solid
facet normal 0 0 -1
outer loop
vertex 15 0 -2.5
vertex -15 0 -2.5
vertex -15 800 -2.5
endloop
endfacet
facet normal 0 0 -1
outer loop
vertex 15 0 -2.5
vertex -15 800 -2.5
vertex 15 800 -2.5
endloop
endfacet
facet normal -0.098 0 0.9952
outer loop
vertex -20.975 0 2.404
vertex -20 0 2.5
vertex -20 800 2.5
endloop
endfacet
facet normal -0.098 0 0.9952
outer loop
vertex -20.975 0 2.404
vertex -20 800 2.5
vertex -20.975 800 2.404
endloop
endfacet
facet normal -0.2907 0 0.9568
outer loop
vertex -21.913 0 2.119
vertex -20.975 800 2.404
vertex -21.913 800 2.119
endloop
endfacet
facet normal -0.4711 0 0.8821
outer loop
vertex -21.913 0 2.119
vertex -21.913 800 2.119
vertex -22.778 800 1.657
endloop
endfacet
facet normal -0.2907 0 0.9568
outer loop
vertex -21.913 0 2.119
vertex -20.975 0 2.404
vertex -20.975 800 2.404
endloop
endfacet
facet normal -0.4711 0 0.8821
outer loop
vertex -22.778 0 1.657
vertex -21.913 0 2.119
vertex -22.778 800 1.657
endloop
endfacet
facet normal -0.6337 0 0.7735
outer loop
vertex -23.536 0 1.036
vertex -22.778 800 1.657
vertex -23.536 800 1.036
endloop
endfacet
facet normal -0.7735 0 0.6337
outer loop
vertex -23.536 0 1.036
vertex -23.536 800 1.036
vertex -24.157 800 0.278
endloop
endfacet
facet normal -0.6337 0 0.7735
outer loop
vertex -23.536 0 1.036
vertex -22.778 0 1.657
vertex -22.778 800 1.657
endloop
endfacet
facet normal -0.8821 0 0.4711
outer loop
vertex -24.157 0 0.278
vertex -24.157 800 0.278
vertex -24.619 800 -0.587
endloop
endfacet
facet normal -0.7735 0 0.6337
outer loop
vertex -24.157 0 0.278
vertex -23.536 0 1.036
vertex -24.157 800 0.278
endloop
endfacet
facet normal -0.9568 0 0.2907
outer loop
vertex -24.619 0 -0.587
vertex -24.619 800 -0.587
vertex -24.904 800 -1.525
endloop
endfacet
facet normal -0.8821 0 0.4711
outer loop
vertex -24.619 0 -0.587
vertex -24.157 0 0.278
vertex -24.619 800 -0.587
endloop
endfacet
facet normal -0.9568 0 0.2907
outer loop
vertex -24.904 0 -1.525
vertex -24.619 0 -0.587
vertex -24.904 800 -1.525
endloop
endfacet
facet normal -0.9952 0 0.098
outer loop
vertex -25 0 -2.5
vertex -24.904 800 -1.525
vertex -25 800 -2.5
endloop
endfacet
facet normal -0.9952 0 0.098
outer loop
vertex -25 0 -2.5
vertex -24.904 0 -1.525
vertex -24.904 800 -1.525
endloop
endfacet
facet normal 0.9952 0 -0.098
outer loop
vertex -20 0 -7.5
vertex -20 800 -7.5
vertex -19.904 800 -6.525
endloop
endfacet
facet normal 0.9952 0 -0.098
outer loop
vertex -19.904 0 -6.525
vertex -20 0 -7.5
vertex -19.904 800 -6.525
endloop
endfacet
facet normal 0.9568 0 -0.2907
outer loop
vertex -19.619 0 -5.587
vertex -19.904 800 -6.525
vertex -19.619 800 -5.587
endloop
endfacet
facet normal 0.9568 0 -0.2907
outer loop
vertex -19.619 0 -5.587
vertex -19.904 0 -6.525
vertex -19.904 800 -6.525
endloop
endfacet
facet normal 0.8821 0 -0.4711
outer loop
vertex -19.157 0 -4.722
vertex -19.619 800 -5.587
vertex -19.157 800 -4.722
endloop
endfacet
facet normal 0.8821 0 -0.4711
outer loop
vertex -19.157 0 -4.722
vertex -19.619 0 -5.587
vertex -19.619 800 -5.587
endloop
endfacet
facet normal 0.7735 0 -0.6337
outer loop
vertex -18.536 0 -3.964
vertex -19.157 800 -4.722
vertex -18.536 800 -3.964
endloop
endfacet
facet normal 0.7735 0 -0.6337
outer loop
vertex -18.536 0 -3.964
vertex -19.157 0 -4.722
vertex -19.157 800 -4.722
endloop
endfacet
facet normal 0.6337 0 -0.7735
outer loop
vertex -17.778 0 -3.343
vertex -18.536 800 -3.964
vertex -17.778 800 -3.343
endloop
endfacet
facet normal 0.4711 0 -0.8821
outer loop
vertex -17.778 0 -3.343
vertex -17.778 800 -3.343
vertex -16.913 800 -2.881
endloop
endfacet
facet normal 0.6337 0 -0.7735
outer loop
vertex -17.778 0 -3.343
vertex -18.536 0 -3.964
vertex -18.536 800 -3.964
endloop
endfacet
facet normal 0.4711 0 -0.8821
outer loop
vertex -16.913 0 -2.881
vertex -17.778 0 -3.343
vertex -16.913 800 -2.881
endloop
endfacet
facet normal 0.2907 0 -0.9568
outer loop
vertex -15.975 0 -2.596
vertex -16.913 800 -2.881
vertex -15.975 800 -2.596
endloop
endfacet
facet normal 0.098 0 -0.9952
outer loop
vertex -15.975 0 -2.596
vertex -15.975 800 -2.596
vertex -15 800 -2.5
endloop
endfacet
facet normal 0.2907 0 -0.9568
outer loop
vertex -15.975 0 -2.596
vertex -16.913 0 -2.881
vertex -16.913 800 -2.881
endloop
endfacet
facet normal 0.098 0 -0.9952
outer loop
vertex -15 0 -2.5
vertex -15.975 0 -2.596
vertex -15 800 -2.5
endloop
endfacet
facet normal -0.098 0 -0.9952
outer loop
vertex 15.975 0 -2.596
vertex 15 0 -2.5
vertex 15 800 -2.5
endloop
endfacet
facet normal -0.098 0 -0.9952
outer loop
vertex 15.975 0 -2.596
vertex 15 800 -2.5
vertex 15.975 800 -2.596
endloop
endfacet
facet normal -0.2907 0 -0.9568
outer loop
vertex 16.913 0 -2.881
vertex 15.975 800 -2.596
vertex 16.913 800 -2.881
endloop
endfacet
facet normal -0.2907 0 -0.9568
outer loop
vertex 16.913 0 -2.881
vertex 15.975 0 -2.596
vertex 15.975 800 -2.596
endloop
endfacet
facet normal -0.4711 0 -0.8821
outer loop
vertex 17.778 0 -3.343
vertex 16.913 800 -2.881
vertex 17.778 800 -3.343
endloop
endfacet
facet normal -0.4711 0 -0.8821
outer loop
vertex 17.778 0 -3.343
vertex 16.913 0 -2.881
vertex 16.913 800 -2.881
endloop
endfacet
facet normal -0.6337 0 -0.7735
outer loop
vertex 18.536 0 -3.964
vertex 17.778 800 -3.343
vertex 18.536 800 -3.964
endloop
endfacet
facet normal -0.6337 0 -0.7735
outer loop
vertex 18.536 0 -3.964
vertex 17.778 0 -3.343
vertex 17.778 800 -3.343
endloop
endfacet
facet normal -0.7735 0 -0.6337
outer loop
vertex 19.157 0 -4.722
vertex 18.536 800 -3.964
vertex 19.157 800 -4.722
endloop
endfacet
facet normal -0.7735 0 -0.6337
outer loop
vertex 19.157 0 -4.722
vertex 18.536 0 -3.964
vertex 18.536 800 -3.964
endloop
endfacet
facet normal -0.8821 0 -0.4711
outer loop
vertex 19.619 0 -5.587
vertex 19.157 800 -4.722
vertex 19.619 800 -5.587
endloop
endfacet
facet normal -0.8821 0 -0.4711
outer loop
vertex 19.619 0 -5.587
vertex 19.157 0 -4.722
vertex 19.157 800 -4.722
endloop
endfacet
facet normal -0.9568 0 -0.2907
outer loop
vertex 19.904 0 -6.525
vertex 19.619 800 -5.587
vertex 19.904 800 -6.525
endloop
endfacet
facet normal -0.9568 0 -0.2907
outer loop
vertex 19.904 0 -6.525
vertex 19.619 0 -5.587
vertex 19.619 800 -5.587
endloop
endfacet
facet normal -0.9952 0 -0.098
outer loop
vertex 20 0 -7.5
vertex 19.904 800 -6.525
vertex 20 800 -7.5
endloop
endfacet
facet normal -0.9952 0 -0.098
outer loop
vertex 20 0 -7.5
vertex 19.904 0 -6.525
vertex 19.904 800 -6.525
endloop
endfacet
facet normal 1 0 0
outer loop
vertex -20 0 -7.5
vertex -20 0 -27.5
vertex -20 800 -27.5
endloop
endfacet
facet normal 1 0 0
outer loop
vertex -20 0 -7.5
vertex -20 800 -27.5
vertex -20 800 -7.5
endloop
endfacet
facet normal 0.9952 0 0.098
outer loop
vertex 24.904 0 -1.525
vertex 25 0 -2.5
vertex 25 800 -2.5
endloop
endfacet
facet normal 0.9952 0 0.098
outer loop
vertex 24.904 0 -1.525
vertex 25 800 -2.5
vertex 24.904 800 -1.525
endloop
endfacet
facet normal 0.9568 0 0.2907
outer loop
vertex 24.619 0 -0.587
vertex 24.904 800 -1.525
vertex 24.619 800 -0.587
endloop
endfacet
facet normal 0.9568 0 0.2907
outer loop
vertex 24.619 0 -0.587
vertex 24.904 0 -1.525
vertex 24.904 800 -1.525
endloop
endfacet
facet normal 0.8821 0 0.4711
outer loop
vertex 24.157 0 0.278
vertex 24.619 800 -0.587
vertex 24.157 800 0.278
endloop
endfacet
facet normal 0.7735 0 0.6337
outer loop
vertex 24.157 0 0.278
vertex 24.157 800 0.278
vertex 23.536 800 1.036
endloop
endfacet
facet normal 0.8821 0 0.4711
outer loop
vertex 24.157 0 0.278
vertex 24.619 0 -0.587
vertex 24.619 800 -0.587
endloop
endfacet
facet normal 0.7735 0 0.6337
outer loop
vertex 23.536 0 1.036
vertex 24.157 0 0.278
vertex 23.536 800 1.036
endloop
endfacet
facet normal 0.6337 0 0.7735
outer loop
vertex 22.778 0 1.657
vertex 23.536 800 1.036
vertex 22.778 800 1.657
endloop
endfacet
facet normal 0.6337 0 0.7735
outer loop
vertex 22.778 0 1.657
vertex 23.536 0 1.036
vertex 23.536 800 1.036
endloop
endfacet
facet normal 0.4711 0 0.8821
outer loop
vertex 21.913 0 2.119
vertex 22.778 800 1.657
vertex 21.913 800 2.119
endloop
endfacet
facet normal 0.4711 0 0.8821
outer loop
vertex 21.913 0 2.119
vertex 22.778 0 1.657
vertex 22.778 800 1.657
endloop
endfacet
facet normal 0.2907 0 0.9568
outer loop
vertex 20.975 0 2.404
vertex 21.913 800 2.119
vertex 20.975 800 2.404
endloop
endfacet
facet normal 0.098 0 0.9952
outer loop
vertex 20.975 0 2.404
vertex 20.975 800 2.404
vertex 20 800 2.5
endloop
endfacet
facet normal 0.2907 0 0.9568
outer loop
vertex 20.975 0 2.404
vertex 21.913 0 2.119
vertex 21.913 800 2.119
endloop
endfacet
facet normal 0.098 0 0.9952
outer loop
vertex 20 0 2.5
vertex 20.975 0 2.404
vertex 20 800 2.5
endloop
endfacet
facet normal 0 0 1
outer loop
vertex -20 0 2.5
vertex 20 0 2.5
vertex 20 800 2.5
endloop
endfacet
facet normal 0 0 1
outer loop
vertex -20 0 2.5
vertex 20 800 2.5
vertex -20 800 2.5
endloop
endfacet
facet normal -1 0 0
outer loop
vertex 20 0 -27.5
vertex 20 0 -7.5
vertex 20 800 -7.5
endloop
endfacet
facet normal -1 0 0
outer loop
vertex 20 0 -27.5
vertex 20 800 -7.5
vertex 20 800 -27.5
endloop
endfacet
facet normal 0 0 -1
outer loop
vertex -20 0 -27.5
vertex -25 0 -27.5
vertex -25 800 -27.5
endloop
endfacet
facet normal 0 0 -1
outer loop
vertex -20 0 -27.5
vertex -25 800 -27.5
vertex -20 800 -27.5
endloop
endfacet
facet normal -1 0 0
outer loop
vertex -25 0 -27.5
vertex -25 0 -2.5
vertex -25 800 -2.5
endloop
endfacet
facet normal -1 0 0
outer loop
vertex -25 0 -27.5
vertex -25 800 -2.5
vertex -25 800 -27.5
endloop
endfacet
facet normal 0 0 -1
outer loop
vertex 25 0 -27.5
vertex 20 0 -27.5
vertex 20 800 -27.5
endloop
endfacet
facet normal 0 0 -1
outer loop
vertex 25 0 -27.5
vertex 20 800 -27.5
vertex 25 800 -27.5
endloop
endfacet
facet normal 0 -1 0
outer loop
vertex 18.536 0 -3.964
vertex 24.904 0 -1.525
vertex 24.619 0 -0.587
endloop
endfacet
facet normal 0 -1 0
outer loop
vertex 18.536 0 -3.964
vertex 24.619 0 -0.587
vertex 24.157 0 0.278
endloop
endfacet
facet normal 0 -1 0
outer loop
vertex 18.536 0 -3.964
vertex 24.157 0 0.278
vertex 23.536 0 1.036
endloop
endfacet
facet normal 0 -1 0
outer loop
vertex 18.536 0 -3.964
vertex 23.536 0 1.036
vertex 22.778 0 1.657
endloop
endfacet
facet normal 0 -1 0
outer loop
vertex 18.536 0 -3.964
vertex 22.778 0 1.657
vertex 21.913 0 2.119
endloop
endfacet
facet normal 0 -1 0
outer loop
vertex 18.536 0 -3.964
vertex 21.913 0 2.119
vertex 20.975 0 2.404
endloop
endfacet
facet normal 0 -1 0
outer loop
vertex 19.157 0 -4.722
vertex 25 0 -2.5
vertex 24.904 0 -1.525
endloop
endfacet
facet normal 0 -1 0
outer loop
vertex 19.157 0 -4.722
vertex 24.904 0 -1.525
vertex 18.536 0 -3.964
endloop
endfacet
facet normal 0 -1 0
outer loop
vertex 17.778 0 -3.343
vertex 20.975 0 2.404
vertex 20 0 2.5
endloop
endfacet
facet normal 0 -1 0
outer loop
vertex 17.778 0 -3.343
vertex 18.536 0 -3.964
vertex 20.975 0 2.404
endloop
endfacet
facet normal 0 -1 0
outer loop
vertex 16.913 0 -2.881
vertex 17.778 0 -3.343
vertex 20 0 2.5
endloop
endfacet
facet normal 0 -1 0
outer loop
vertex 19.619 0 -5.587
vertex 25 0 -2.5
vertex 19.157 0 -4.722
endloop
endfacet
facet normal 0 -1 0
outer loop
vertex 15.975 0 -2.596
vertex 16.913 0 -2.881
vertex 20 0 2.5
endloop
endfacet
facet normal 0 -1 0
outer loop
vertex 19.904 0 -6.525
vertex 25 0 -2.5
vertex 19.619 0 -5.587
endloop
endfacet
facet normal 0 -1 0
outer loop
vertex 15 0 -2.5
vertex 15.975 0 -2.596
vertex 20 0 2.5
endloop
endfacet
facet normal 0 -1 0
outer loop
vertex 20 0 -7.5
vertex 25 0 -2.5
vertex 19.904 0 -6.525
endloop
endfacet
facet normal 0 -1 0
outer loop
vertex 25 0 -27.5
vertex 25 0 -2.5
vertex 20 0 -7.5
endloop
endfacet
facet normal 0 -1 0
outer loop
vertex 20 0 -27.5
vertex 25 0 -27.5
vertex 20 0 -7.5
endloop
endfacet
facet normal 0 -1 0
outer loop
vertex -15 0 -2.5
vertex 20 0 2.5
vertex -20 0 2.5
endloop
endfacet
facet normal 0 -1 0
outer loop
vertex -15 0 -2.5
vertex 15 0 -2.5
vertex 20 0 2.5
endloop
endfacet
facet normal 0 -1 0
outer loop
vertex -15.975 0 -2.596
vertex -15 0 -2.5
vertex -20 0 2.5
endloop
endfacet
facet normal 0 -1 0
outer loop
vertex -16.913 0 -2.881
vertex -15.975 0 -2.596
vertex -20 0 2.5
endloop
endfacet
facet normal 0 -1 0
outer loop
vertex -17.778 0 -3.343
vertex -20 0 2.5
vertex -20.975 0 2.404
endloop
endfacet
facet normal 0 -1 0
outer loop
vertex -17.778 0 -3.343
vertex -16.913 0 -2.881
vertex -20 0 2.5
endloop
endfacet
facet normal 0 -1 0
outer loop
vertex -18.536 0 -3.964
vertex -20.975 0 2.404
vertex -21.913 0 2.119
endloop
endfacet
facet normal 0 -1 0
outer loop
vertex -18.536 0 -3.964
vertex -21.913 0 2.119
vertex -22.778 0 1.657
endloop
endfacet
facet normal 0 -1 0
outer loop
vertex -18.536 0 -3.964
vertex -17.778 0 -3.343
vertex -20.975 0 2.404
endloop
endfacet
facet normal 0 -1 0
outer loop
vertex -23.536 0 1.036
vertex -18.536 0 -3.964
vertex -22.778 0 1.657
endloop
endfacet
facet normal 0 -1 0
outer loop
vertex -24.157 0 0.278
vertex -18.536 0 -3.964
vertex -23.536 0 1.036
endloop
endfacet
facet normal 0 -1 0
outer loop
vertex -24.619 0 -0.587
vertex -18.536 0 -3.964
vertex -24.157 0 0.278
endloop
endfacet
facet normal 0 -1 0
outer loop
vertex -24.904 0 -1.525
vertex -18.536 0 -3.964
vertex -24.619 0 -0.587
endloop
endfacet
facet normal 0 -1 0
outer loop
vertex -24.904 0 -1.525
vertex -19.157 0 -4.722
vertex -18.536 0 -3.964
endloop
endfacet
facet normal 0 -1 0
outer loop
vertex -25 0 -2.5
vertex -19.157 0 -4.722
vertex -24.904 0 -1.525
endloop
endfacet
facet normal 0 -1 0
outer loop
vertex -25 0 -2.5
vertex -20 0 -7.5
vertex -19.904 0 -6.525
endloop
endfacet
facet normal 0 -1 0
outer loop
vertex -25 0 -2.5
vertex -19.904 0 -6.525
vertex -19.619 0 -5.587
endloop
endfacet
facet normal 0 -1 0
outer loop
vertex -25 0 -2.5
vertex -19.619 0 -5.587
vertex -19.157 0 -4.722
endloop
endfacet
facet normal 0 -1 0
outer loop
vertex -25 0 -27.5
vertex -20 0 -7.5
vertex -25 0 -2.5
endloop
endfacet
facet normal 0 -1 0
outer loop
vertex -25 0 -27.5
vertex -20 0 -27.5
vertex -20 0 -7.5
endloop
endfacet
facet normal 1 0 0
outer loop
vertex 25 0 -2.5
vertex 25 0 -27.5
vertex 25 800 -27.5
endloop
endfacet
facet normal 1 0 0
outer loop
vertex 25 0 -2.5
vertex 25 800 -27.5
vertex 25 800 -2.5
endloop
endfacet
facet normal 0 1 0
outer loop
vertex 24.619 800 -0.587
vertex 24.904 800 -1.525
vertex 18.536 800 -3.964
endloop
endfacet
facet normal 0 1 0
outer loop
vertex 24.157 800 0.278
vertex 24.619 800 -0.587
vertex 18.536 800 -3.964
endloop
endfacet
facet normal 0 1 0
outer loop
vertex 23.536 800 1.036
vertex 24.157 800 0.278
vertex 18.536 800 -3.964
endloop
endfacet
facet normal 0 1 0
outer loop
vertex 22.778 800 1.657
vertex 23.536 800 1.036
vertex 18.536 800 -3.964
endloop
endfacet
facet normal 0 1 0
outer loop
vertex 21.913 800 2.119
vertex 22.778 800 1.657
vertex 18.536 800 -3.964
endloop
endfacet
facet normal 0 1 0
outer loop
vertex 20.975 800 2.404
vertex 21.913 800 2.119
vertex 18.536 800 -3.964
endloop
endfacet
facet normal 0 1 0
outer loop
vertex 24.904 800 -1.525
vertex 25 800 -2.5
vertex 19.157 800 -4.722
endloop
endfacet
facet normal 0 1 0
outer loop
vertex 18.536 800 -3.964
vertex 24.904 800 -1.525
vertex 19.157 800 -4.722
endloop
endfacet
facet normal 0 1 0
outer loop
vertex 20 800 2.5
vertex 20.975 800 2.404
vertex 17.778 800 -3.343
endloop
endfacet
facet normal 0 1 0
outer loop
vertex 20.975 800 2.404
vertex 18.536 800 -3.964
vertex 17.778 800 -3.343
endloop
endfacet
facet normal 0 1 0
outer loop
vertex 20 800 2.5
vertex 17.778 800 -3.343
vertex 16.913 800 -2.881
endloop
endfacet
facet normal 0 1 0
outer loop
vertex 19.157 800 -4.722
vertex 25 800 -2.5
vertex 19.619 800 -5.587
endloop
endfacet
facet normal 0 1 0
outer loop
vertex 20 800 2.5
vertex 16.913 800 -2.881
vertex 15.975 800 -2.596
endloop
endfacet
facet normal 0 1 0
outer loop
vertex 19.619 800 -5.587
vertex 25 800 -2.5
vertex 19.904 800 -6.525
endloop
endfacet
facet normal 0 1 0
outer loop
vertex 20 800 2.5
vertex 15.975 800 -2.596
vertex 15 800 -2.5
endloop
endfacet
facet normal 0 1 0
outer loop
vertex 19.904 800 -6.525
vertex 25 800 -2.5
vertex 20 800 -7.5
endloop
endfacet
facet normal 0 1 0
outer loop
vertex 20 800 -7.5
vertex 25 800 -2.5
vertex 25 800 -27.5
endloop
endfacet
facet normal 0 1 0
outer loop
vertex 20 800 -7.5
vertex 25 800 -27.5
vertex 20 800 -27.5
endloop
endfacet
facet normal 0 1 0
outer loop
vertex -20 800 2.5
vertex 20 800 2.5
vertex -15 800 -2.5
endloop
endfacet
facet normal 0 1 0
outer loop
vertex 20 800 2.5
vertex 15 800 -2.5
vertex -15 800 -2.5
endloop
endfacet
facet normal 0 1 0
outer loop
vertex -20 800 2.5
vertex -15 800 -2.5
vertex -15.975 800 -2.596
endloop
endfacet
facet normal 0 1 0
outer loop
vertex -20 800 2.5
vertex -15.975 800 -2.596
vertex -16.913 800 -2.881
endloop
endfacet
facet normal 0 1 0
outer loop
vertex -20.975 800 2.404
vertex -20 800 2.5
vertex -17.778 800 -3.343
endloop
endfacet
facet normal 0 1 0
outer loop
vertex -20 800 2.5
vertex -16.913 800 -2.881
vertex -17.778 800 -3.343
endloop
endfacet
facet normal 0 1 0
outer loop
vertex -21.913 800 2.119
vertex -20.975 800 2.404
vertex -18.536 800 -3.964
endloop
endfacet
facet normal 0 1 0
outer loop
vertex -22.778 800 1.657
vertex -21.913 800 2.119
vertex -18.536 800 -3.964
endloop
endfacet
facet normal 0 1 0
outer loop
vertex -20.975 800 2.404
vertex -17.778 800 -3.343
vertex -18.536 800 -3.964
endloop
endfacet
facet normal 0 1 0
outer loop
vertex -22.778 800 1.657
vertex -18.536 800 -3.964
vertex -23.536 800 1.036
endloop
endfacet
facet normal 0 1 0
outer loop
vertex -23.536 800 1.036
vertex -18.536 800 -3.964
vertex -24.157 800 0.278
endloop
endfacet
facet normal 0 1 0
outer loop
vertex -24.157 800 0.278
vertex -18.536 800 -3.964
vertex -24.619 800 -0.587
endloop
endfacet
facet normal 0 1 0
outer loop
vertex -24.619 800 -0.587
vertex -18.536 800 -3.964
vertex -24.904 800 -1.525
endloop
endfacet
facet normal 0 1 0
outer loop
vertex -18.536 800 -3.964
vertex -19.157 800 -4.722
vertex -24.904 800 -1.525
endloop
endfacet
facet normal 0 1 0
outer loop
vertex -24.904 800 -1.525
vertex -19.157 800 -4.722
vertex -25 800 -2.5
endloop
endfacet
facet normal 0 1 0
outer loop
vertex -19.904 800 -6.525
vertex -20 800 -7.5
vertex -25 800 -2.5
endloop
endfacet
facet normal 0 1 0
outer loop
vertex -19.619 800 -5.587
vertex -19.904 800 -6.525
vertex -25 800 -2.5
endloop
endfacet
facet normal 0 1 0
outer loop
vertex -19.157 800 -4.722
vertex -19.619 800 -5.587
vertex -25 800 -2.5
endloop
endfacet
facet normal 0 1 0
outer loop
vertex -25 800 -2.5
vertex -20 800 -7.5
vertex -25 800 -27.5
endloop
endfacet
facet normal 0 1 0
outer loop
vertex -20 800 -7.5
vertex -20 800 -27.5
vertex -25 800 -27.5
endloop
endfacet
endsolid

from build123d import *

# Parameters (mm, degrees)
BOSS_EXTRUDE2_DEPTH = 800


with BuildPart() as part:
    # Sketch1 → Boss-Extrude2 (new body)
    with BuildSketch(Plane(origin=(0, 0, 0), x_dir=(1, 0, 0), z_dir=(0, 1, 0))):
        with BuildLine():
            Line((-15, 2.5), (15, 2.5))
            ThreePointArc((15, 2.5), (18.535533906, 3.964466094), (20, 7.5))
            Line((20, 7.5), (20, 27.5))
            Line((20, 27.5), (25, 27.5))
            Line((25, 27.5), (25, 2.5))
            ThreePointArc((25, 2.5), (23.535533906, -1.035533906), (20, -2.5))
            Line((20, -2.5), (-20, -2.5))
            ThreePointArc((-20, -2.5), (-23.535533906, -1.035533906), (-25, 2.5))
            Line((-25, 2.5), (-25, 27.5))
            Line((-25, 27.5), (-20, 27.5))
            Line((-20, 27.5), (-20, 7.5))
            ThreePointArc((-20, 7.5), (-18.535533906, 3.964466094), (-15, 2.5))
        make_face()
    extrude(amount=BOSS_EXTRUDE2_DEPTH)


solid = part.part
